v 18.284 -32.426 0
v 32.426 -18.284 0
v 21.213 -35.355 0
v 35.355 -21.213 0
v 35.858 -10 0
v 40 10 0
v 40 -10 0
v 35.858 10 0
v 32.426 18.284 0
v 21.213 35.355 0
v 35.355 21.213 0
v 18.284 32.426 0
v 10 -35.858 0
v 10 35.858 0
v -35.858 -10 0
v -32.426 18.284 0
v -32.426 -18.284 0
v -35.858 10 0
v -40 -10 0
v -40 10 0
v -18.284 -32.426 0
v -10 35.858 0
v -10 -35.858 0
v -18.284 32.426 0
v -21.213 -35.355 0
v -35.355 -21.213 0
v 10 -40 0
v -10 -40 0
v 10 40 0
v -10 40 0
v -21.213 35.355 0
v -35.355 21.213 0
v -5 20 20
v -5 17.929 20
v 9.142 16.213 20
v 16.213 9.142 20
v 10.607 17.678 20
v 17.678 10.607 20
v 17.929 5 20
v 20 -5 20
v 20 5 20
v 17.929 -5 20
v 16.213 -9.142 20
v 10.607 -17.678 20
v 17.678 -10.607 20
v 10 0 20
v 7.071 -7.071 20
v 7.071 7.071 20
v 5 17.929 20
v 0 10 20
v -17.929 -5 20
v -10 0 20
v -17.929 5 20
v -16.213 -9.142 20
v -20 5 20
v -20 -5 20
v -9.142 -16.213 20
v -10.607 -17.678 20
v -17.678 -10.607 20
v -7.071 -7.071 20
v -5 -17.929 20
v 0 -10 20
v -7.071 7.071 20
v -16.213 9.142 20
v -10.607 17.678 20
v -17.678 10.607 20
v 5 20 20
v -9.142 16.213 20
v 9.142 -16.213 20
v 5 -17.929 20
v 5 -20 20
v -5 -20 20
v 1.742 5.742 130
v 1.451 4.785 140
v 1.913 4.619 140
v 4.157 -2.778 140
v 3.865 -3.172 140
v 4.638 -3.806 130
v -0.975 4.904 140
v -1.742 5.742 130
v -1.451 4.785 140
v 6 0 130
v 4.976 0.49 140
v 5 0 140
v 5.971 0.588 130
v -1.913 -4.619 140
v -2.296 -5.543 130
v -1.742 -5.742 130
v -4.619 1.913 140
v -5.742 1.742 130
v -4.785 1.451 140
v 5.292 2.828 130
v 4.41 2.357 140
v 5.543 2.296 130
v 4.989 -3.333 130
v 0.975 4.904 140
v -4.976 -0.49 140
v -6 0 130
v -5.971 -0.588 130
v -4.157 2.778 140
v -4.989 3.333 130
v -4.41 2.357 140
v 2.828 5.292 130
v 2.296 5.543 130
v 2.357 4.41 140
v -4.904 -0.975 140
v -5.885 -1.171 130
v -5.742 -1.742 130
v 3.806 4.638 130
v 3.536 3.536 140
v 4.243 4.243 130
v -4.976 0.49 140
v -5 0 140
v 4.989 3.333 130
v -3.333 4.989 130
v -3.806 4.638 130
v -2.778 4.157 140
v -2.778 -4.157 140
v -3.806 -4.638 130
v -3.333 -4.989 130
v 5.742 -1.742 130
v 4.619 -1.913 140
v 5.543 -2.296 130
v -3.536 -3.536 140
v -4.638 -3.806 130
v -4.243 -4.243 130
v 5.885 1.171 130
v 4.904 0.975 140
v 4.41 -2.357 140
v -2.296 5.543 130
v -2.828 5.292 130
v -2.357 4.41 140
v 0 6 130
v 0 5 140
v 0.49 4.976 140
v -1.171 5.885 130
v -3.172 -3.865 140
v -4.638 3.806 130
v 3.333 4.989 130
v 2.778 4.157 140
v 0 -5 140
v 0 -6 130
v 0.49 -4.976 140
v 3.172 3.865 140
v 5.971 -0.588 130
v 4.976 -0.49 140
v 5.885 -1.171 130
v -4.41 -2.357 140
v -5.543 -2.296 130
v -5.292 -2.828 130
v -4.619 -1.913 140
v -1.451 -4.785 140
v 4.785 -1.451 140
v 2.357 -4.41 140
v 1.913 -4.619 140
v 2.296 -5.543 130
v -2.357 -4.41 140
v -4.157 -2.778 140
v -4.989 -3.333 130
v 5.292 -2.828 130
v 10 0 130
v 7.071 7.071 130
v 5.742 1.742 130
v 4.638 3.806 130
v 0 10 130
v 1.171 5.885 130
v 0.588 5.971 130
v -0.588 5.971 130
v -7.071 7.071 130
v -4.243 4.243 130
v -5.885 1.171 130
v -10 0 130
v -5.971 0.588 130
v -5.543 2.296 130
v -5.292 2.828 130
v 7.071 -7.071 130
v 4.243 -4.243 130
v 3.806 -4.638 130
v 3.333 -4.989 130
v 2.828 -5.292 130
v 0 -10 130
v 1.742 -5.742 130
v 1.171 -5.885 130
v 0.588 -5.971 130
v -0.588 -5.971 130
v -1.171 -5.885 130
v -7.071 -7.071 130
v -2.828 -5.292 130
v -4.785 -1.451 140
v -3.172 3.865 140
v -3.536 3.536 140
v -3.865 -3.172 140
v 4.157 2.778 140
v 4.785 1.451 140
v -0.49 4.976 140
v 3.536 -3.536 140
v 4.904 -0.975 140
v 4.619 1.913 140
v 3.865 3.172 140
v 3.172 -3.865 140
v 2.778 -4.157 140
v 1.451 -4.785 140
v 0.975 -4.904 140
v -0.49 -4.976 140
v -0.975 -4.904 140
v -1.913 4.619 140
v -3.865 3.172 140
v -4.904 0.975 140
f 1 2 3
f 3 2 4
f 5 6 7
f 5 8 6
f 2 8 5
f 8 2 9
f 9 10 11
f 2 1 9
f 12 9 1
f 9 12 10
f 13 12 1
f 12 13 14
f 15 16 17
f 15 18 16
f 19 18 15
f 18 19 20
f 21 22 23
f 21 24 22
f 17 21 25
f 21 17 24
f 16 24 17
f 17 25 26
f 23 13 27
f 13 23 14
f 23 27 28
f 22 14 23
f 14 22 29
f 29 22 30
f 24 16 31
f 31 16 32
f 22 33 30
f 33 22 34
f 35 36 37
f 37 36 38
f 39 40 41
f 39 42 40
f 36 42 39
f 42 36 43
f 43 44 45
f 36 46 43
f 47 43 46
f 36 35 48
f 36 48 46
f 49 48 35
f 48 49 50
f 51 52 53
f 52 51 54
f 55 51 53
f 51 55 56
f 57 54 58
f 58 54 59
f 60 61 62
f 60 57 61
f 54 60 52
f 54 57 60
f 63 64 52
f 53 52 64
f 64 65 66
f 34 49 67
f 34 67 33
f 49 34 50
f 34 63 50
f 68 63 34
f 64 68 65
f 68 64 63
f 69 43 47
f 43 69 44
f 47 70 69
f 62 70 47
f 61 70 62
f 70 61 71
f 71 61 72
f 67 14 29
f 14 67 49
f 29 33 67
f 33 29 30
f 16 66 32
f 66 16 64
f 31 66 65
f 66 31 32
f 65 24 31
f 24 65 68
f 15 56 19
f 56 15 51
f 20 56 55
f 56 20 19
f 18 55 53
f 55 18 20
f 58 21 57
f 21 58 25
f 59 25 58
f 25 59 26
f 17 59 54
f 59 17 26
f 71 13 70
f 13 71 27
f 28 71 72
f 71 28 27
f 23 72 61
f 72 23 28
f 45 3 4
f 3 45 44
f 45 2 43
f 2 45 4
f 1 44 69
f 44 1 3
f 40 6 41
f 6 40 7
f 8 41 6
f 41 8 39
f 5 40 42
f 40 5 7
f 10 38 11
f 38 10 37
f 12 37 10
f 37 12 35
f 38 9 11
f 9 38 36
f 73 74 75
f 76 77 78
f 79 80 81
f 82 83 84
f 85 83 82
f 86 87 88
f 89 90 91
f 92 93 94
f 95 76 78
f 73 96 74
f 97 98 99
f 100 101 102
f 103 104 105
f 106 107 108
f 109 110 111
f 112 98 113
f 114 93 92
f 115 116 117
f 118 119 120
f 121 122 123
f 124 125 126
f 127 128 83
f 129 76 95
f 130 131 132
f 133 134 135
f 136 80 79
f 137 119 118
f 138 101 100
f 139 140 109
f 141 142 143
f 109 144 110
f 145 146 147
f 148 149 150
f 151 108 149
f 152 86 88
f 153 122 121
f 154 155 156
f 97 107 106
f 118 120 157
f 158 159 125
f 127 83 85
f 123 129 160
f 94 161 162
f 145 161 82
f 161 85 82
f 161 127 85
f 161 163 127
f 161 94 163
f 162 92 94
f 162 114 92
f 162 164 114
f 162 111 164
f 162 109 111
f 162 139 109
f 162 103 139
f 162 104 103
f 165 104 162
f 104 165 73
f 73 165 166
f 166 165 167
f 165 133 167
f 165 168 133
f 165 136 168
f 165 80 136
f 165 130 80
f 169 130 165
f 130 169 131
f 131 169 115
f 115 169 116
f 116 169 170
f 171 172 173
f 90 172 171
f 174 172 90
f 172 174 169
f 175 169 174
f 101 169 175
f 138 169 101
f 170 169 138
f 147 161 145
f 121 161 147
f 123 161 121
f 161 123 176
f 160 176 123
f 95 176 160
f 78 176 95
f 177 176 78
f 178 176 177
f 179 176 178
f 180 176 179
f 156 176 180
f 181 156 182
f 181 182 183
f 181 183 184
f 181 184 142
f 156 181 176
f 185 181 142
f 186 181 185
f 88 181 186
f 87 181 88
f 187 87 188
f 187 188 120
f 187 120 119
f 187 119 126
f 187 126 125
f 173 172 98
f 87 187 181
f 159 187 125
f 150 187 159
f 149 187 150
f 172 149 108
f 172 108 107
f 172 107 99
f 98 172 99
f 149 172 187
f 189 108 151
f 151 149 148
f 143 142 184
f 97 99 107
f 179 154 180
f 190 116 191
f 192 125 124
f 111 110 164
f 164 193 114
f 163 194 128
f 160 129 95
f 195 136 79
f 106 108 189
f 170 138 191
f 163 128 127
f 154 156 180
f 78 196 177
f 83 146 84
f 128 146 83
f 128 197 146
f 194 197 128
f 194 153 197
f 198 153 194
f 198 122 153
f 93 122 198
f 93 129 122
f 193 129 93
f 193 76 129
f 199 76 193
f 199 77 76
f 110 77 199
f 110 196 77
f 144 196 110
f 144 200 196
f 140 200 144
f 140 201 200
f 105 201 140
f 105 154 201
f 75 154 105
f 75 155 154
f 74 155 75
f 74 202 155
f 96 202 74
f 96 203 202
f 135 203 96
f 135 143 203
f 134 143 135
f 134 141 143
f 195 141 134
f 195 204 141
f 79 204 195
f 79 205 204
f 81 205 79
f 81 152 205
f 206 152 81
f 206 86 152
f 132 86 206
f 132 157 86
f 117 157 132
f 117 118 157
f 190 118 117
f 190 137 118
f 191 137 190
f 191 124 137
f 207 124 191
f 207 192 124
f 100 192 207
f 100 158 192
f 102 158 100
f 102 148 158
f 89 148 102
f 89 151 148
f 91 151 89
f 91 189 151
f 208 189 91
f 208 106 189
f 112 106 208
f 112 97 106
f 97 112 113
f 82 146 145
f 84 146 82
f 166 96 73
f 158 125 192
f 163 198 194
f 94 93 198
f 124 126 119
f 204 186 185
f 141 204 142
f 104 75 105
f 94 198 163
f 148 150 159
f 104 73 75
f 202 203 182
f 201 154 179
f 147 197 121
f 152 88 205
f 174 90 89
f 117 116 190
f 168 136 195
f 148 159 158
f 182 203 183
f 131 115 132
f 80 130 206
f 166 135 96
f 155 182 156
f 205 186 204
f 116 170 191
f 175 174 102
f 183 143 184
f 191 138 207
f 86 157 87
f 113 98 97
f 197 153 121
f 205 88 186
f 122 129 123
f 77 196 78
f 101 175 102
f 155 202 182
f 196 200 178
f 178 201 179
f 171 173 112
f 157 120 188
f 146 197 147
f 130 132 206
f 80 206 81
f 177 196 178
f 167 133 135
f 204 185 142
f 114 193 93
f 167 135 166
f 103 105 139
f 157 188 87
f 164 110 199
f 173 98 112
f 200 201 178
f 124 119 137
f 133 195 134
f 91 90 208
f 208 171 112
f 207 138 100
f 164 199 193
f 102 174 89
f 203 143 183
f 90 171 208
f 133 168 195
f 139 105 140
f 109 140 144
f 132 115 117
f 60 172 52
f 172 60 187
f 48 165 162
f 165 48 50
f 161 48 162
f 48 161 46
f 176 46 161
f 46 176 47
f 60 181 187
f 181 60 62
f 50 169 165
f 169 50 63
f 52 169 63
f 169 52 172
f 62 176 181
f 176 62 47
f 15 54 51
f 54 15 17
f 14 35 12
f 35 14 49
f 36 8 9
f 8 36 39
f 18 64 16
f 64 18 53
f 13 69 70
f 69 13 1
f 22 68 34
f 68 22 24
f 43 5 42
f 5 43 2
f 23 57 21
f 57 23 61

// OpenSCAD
STAND_SIZE_Z=120;
STAND_ROD_SIZE_Z=10;
STAND_ROD_Z_DIFF=10;
STAND_INNER_Z=9;

STAND_ROD_DIAMETER=12;
STAND_DIAMETER=20;

STAND_SIDES=8;

STAND_LEG_SIZE_X=20;
STAND_LEG_SIZE_Y=40;
STAND_LEG_SIZE_Z=20;
STAND_LEG_KOEF=0.5;

module rod(diff) {
    translate([0, 0, STAND_SIZE_Z+diff])
        cylinder(r1=STAND_ROD_DIAMETER / 2, h=STAND_ROD_SIZE_Z, r2=STAND_ROD_DIAMETER / 2 - 1, center=false, $fn=64);
    cylinder(r=STAND_DIAMETER / 2, h=STAND_SIZE_Z+diff, center=false, $fn=STAND_SIDES);
}

module leg() {
    linear_extrude(height=STAND_LEG_SIZE_Z, scale=STAND_LEG_KOEF)
        translate([0 - STAND_LEG_SIZE_X / 2, 0, 0])
            square([STAND_LEG_SIZE_X, STAND_LEG_SIZE_Y]);
}

for(i=[0:STAND_SIDES]) {
    rotate([0, 0, i * 360 / STAND_SIDES])
        leg();
}

cylinder(r1=STAND_LEG_SIZE_Y, r2=STAND_LEG_SIZE_Y * STAND_LEG_KOEF, h=STAND_LEG_SIZE_Z, $fn=STAND_SIDES);


/* rod(0); */
rod(STAND_ROD_Z_DIFF);
